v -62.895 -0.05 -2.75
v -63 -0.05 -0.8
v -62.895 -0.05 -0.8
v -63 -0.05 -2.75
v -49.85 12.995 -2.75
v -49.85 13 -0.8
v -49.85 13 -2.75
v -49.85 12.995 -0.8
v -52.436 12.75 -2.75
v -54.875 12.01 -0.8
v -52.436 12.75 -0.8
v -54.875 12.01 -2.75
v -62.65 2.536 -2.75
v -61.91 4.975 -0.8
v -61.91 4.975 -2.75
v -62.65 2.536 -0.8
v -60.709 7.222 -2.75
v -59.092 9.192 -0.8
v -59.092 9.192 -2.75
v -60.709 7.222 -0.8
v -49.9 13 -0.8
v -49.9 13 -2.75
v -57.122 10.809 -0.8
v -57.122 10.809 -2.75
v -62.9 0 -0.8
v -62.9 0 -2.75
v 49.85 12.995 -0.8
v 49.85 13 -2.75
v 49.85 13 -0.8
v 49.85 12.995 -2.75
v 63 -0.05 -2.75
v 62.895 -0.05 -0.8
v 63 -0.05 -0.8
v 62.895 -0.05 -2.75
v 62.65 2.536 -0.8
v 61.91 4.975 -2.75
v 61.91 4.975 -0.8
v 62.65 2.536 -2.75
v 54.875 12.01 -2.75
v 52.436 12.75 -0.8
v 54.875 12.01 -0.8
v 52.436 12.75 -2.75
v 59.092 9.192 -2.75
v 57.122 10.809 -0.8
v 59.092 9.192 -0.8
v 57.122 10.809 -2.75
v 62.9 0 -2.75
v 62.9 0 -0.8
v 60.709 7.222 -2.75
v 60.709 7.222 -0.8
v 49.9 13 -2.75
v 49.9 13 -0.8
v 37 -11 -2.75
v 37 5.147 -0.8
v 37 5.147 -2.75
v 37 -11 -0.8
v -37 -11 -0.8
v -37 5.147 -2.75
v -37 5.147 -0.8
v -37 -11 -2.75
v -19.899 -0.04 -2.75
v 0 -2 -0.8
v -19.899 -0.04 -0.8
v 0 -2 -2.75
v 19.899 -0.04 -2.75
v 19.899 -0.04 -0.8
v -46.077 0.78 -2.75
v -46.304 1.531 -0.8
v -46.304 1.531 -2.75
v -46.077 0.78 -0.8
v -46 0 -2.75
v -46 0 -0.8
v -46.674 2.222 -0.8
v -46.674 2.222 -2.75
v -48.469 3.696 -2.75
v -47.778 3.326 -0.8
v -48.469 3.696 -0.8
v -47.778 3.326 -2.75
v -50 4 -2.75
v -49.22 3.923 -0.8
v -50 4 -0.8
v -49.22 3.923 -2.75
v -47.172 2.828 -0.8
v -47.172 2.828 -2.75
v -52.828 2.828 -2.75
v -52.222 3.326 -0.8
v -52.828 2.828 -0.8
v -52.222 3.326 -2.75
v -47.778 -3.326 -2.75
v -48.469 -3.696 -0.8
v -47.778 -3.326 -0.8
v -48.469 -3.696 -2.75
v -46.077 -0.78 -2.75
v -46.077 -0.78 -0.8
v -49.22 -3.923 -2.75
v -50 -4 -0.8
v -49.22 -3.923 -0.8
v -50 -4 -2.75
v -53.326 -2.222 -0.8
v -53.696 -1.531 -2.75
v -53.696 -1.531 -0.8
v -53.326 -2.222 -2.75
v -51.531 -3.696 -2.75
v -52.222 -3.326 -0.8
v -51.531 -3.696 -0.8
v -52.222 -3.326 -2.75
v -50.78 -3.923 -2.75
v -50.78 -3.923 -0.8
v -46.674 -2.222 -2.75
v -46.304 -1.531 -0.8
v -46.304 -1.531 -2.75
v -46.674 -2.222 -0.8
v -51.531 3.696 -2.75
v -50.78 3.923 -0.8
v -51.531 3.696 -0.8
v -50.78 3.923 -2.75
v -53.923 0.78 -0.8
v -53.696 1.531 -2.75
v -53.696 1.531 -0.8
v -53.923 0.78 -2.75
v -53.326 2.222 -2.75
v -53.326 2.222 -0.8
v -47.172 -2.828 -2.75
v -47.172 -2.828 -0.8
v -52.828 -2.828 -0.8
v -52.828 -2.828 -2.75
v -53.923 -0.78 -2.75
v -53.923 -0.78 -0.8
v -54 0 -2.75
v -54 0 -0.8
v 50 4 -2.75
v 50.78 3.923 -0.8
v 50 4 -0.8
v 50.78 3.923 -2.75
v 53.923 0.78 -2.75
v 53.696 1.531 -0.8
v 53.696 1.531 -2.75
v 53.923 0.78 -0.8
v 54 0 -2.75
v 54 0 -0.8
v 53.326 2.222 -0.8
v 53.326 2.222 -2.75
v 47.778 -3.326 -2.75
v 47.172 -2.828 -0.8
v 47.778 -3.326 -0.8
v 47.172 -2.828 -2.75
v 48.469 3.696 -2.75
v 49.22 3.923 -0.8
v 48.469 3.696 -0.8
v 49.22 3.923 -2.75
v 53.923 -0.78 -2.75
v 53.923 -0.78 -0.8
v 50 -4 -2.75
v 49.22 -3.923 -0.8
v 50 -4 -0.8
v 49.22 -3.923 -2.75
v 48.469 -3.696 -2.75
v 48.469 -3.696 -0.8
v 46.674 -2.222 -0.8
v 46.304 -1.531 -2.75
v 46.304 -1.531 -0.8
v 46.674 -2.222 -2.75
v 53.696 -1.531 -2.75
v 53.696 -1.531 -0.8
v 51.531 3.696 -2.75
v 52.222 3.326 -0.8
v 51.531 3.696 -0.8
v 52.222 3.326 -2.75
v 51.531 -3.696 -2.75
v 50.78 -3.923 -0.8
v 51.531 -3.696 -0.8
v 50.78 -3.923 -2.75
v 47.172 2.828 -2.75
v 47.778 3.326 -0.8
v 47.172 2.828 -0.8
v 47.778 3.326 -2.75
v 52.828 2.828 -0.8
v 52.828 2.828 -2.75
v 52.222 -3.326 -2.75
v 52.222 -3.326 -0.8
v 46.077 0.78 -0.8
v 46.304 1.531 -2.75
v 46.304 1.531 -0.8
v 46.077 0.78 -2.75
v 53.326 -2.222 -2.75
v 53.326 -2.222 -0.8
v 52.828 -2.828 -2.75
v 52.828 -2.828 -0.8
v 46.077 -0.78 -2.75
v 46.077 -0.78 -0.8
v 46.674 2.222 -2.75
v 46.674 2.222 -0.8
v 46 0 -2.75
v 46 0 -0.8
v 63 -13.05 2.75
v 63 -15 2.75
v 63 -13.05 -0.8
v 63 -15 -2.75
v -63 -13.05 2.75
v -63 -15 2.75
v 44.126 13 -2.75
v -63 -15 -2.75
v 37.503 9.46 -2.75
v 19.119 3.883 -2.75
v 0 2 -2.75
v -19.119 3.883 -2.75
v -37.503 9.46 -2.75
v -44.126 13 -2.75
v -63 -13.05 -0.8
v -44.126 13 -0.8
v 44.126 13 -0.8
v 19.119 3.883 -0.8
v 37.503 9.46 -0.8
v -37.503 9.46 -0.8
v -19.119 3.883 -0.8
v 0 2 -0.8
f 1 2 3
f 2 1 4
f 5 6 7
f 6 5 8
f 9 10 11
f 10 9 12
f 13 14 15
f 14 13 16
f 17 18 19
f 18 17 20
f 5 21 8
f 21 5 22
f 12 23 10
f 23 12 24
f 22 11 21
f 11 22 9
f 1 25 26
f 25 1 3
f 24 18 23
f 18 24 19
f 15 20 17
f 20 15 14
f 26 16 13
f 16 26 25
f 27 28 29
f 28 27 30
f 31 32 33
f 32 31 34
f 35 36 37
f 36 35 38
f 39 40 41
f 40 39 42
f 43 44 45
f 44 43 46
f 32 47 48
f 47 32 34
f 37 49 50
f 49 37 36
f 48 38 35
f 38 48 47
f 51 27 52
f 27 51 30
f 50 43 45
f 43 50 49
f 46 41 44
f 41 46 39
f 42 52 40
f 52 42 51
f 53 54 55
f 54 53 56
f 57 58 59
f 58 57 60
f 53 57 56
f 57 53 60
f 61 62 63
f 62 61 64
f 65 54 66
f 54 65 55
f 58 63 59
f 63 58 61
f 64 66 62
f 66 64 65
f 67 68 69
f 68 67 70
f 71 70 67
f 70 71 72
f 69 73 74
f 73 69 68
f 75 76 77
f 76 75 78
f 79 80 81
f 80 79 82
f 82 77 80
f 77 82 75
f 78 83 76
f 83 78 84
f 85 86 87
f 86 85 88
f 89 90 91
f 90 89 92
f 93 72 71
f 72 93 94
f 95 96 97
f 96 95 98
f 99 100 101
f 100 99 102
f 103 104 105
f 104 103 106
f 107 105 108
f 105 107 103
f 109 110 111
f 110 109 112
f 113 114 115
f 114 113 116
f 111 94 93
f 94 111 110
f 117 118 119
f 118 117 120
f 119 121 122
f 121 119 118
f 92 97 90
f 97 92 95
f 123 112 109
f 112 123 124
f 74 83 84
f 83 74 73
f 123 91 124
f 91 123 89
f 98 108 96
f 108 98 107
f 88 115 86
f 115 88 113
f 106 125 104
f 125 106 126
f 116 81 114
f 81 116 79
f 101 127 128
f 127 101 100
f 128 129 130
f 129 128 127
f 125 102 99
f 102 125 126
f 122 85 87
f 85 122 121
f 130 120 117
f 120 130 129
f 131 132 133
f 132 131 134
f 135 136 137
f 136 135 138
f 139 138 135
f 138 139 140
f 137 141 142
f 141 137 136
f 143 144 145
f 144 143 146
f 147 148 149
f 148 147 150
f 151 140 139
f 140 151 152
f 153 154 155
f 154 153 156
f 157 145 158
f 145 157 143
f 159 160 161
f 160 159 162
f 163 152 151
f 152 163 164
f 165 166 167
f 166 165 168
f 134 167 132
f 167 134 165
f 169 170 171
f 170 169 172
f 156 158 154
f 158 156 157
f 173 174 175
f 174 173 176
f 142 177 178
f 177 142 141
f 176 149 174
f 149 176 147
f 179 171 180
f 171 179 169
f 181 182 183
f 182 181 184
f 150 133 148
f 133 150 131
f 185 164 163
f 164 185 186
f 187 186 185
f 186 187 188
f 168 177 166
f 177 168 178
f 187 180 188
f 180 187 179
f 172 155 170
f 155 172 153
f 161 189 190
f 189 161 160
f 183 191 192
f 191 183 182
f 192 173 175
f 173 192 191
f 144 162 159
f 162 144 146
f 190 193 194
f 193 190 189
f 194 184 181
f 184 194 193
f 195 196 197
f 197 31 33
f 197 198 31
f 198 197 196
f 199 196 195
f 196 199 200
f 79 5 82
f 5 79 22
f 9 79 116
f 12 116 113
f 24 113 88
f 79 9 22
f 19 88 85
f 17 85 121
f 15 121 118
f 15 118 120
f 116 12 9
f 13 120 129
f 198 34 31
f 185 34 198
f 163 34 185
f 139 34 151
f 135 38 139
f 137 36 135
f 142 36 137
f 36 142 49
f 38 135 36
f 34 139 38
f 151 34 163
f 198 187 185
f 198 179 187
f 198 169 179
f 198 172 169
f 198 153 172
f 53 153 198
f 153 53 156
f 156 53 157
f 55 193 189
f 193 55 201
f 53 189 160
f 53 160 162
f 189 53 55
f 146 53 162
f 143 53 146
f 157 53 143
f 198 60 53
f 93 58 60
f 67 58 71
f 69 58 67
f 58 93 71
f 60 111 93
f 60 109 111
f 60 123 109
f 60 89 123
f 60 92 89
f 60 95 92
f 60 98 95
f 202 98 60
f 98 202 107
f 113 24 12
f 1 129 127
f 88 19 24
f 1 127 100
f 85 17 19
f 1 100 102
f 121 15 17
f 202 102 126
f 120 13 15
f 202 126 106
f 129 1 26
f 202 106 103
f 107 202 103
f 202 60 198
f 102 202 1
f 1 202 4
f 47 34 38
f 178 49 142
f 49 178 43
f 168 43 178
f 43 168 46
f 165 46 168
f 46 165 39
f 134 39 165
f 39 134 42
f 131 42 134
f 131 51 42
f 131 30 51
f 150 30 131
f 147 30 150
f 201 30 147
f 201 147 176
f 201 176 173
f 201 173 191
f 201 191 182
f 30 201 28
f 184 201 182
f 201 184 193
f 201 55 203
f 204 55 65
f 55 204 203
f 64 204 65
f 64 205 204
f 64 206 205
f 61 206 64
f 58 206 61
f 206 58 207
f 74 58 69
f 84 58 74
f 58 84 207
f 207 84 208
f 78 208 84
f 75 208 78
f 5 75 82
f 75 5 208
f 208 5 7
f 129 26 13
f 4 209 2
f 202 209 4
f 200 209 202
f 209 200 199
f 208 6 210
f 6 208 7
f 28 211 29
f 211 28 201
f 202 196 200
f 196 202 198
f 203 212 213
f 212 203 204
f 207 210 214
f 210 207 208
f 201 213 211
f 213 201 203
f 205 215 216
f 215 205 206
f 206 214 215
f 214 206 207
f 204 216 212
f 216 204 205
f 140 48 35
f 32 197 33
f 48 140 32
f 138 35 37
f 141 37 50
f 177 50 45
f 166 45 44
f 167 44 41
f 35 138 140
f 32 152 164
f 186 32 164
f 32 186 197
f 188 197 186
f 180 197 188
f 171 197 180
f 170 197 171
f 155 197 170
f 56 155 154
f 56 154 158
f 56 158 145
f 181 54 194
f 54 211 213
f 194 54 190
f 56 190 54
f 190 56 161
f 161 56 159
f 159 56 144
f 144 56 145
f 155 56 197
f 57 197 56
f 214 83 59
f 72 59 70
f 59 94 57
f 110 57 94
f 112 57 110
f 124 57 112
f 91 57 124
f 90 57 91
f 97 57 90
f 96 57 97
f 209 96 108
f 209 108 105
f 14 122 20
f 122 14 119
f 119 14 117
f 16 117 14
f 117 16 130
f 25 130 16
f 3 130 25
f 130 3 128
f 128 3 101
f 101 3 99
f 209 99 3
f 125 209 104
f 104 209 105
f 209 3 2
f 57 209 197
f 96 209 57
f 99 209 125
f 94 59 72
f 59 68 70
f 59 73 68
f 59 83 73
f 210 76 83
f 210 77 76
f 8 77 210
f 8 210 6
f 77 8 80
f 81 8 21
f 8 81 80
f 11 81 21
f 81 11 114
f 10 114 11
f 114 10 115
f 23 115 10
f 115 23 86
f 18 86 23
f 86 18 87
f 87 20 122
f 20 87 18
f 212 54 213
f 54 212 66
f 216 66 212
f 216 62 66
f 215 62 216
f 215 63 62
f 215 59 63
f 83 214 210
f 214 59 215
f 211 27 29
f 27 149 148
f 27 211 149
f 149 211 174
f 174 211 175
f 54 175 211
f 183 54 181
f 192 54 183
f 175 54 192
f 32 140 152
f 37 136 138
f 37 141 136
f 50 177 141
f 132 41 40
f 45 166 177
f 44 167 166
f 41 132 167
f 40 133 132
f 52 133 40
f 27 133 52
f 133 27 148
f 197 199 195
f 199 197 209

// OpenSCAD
$fn = 32;

module spool(d = 200, h = 5) {
	cylinder(d = d, h = h, center = true);
}

module b608(d = 22, width = 7, id = 8) {
	difference() {
		cylinder(d = d, h = width, center = true);
		cylinder(d = id, h = width+0.1, center = true);
	}
}

module half(dist = 100, bd = 22, bid = 8, bw = 7, thick = 2, spool_dia = 200) {
	spool_round = spool_dia - 2*thick;
	edge_round = bd + 2*thick;

	length = dist + bd + 2*thick;
	height = bd + 3*thick;
	width = thick + bw/2;
	difference() {
		translate([0, -thick/2, 0])
			cube([length, height, width], center = true);

		// cut off roundings
		translate([0, spool_dia/2, 0])
			cylinder(d = spool_round, h = height + 0.1, center = true);
		erc = edge_round/2 + 0.1;
		translate([-length/2 + erc/2, erc/2, 0])
			rotate([0, 0, 90])
				difference() {
					cube([erc + 0.1, erc + 0.1, width + 0.1], center = true);
					translate([-erc/2, -erc/2, 0])
						cylinder(d = edge_round, h = width + 0.2, center = true);
				}
		translate([length/2 - erc/2, erc/2, 0])
			difference() {
				cube([erc + 0.1, erc + 0.1, width + 0.1], center = true);
				translate([-erc/2, -erc/2, 0])
					cylinder(d = edge_round, h = width + 0.2, center = true);
			}

		// cut out a cutout
		difference() {
			cube([dist - bd - 2*thick, bd, width + 0.1], center = true);
			cut_spool_dia = spool_dia + 2*thick;
			translate([0, spool_dia/2, 0])
				cylinder(d = cut_spool_dia, h = width + 0.1, center = true);
		}

		// cut out space for bearing
		translate([0, 0, thick/2])
			cube([length + 0.1, height - thick + 0.1,
				width - thick + 0.1], center = true);

		// cut out bearing axle
		for (a = [-1:2:1])
			translate([a*dist/2, 0, 0])
				cylinder(d = bid, h = height + 0.1, center = true);
	}
}

translate([0, 100, 3]) %spool();
translate([-50, 0, 3]) %b608();
translate([50, 0, 3]) %b608();

half();
